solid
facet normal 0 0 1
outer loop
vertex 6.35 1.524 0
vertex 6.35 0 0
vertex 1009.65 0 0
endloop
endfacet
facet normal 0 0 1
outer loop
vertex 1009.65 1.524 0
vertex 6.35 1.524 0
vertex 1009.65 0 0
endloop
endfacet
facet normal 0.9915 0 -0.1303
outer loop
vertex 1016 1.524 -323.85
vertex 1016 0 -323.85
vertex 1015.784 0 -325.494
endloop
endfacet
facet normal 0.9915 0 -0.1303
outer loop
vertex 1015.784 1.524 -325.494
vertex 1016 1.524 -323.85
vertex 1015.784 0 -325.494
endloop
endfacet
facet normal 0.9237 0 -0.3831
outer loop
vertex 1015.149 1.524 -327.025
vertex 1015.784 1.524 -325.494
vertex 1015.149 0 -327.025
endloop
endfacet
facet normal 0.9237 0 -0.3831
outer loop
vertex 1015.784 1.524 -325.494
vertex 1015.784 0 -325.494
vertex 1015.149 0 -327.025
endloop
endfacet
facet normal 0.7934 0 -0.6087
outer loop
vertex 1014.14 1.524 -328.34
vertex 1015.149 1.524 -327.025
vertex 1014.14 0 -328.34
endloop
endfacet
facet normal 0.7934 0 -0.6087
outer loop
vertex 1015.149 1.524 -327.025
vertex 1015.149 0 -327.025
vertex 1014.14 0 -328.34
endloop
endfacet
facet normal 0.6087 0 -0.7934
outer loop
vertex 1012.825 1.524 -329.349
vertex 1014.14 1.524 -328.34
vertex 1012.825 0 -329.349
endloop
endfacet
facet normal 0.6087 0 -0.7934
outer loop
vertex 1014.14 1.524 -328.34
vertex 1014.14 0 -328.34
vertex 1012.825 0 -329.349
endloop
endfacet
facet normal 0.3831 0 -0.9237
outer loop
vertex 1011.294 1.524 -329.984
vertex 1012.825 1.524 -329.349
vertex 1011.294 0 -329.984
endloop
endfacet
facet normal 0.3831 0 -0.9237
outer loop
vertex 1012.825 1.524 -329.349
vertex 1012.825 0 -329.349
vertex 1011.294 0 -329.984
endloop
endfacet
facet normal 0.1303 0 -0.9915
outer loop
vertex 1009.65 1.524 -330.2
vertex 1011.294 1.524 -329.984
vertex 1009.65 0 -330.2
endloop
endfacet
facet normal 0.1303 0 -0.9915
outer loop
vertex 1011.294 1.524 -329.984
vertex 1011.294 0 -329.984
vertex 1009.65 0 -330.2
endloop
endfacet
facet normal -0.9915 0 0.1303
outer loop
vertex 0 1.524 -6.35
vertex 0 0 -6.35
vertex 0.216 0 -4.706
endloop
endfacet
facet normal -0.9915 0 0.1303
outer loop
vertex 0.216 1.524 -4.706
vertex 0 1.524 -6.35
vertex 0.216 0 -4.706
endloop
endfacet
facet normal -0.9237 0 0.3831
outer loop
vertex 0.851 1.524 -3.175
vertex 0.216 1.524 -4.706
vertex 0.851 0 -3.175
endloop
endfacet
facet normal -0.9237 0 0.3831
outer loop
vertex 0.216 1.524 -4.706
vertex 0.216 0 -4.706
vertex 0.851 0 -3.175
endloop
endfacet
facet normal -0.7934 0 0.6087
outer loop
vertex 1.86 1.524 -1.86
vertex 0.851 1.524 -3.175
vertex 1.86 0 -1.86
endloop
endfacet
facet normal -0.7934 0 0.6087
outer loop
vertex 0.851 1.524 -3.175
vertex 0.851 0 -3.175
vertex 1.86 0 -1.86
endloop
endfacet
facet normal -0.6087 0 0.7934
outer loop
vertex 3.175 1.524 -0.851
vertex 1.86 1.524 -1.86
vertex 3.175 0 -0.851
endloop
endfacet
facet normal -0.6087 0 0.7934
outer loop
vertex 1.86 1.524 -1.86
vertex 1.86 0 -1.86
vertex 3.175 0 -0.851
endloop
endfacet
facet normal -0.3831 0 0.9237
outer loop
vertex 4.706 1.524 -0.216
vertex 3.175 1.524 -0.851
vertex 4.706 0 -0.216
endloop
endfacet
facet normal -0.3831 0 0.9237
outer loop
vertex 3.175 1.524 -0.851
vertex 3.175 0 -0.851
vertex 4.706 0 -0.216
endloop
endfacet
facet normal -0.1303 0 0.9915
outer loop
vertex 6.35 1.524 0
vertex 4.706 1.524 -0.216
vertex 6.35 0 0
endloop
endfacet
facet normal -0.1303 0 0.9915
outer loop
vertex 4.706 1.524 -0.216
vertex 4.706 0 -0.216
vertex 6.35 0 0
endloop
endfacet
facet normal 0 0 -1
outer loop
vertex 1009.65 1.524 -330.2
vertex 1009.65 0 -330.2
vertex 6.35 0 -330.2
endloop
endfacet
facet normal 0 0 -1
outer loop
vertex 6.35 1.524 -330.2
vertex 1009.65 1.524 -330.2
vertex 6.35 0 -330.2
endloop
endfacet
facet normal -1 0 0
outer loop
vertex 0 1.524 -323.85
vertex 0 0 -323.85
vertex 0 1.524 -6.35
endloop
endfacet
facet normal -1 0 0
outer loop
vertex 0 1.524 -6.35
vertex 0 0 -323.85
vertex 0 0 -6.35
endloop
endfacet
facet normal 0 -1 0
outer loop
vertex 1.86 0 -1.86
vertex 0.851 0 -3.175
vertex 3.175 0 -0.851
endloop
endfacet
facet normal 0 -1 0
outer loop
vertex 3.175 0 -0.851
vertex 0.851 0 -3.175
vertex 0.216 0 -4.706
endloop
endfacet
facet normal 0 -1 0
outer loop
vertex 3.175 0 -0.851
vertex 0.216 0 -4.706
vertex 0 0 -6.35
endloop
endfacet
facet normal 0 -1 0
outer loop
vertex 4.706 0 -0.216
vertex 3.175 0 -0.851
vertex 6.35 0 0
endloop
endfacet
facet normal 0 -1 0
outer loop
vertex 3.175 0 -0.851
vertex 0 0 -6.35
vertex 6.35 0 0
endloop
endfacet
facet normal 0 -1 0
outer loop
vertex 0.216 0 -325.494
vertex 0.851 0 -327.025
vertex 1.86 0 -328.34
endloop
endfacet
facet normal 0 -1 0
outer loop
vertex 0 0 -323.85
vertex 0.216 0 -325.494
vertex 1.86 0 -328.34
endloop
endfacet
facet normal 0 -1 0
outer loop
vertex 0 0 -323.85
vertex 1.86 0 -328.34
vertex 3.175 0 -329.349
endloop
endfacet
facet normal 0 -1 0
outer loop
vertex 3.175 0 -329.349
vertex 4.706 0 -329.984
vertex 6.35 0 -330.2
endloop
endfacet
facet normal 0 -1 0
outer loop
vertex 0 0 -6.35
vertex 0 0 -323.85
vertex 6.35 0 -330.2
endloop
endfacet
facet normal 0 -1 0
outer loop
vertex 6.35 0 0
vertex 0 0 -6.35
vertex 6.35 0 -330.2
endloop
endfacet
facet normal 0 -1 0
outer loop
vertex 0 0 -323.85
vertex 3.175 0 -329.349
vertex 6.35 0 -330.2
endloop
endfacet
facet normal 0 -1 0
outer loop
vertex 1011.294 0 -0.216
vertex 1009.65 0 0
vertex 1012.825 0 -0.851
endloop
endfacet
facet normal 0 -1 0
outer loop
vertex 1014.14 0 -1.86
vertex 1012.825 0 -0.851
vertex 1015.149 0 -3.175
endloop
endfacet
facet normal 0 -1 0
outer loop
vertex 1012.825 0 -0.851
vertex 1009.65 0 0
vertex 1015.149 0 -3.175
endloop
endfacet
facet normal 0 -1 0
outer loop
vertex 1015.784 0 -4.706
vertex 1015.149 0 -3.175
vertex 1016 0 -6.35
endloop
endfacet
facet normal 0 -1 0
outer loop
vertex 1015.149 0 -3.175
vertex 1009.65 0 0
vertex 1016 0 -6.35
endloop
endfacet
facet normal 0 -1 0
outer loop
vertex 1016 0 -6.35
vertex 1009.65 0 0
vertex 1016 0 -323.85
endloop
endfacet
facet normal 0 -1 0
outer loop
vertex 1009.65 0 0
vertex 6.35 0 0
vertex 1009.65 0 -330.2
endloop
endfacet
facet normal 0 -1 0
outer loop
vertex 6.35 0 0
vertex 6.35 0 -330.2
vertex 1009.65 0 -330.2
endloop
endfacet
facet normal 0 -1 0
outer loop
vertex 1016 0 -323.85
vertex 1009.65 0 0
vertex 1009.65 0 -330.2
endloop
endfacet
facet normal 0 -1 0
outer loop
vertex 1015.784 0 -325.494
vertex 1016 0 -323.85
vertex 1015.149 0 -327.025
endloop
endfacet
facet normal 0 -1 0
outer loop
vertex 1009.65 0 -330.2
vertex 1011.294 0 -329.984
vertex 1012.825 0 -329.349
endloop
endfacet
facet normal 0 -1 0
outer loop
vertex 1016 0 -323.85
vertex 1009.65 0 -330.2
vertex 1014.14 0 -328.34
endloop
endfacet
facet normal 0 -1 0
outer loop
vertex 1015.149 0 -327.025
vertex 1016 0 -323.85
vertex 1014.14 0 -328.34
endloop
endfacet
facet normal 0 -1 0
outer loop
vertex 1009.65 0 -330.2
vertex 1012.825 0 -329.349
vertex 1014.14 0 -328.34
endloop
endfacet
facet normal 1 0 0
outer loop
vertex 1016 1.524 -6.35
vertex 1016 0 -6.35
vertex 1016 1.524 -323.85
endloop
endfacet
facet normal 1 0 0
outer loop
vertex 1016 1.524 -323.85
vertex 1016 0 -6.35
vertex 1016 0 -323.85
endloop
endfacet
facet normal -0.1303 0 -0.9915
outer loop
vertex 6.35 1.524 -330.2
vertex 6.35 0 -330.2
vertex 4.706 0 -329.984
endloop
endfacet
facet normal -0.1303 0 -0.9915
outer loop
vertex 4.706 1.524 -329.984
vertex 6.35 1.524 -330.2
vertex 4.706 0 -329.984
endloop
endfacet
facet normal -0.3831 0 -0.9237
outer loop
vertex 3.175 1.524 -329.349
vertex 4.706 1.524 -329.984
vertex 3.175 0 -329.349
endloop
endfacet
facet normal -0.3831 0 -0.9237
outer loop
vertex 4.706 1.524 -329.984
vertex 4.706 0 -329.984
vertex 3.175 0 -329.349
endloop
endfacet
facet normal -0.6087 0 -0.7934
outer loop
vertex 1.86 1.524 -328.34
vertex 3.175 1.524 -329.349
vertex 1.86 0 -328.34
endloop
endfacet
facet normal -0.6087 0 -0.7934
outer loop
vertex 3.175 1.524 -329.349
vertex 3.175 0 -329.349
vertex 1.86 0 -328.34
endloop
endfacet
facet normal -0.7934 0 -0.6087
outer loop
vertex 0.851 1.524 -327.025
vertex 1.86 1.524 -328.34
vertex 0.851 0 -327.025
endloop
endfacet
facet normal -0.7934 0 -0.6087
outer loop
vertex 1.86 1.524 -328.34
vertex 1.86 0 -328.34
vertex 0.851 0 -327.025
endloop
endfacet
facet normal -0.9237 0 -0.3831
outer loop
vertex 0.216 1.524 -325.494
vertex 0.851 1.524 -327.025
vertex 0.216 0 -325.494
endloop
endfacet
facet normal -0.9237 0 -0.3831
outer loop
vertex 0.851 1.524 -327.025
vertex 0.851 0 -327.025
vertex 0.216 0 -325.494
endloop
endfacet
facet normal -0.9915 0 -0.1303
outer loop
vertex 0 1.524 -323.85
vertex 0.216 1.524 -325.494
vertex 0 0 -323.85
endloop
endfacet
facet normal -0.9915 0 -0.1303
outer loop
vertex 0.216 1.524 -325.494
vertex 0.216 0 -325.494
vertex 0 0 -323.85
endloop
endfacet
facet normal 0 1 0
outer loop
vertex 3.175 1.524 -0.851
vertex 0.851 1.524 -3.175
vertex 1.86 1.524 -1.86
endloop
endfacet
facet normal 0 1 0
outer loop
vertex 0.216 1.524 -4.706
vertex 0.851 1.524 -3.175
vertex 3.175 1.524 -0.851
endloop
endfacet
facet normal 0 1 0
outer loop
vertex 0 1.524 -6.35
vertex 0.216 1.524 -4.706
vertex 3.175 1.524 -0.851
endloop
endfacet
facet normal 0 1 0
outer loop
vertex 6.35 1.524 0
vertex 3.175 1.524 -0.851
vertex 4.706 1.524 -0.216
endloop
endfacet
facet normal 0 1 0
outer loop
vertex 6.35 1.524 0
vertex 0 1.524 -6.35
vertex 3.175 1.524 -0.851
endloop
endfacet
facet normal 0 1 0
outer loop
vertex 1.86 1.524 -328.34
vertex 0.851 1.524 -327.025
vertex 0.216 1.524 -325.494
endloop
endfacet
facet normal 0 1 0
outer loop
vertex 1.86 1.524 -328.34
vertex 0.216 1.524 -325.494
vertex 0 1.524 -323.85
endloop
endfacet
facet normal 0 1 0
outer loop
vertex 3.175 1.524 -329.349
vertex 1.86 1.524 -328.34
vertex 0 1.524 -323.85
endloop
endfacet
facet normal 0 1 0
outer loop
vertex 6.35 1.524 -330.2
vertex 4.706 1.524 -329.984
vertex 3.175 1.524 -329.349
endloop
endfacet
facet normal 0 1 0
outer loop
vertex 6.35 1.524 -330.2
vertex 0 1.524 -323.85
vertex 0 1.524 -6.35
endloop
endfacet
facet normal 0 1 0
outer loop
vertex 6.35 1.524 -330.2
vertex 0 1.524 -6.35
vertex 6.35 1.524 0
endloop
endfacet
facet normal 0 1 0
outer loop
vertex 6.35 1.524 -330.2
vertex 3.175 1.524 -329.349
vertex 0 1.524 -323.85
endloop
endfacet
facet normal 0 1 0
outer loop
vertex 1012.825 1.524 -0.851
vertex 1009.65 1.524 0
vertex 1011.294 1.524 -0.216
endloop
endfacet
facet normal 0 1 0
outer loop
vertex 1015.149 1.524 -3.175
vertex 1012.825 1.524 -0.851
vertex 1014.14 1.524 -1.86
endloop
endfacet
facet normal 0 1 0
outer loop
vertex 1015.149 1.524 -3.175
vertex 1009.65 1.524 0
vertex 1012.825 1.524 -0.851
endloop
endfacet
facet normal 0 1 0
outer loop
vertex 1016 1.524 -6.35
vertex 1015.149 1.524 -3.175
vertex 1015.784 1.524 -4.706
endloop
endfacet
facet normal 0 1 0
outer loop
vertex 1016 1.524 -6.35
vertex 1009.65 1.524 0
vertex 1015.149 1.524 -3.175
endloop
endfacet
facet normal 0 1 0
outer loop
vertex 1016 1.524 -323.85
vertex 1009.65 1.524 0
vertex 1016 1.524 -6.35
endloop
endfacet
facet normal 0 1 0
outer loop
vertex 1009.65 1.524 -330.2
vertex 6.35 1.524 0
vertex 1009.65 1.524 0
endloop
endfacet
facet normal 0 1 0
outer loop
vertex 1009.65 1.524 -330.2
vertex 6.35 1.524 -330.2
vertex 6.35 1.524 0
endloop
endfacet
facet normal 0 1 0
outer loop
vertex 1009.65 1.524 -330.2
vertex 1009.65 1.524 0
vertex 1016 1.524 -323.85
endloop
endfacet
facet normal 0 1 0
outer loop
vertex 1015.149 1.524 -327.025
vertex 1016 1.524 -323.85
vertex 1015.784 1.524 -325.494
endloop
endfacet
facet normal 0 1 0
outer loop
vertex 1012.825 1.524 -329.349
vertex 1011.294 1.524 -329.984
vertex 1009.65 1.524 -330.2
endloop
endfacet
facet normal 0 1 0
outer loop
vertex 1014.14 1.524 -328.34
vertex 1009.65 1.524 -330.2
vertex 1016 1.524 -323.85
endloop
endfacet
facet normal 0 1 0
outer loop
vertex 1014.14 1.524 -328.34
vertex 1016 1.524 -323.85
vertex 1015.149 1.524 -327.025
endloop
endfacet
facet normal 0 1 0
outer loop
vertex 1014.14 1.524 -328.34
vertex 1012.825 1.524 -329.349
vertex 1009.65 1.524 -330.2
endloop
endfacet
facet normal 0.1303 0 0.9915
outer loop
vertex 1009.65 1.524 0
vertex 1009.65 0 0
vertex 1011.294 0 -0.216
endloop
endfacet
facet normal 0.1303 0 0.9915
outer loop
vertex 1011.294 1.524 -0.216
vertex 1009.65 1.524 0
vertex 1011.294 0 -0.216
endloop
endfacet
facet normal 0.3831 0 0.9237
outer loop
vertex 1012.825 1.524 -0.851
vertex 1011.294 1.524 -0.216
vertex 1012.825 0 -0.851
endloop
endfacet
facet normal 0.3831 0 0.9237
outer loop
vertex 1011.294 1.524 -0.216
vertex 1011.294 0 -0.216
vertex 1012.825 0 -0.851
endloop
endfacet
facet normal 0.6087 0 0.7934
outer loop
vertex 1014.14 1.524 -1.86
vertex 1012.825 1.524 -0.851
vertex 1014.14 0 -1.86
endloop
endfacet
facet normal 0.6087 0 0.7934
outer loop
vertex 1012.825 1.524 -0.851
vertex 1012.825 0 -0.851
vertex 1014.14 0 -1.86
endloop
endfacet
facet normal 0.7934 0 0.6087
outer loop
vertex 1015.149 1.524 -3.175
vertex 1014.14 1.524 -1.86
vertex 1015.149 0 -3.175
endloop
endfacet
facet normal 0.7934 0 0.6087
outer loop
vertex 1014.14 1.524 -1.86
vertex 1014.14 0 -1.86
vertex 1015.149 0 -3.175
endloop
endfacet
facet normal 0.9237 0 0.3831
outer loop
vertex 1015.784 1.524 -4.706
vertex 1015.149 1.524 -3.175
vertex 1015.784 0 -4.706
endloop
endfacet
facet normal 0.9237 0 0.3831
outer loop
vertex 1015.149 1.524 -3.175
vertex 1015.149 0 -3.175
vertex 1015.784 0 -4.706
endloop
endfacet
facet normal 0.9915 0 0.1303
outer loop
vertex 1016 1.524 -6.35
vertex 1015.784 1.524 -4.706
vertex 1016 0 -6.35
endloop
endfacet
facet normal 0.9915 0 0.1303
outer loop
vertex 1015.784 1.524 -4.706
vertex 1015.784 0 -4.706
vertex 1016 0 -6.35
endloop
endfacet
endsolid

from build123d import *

# Parameters (mm, degrees)
BOSS_EXTRUDE1_DEPTH = 1.524


with BuildPart() as part:
    # Sketch1 → Boss-Extrude1 (new body)
    with BuildSketch(Plane(origin=(0, 0, 0), x_dir=(1, 0, 0), z_dir=(0, 1, 0))):
        with BuildLine():
            Line((6.35, 0), (1009.65, 0))
            ThreePointArc((1009.65, 0), (1014.140128061, 1.859871939), (1016, 6.35))
            Line((1016, 6.35), (1016, 323.85))
            ThreePointArc((1016, 323.85), (1014.140128061, 328.340128061), (1009.65, 330.2))
            Line((1009.65, 330.2), (6.35, 330.2))
            ThreePointArc((6.35, 330.2), (1.859871939, 328.340128061), (0, 323.85))
            Line((0, 323.85), (0, 6.35))
            ThreePointArc((0, 6.35), (1.859871939, 1.859871939), (6.35, 0))
        make_face()
    extrude(amount=BOSS_EXTRUDE1_DEPTH)


solid = part.part
